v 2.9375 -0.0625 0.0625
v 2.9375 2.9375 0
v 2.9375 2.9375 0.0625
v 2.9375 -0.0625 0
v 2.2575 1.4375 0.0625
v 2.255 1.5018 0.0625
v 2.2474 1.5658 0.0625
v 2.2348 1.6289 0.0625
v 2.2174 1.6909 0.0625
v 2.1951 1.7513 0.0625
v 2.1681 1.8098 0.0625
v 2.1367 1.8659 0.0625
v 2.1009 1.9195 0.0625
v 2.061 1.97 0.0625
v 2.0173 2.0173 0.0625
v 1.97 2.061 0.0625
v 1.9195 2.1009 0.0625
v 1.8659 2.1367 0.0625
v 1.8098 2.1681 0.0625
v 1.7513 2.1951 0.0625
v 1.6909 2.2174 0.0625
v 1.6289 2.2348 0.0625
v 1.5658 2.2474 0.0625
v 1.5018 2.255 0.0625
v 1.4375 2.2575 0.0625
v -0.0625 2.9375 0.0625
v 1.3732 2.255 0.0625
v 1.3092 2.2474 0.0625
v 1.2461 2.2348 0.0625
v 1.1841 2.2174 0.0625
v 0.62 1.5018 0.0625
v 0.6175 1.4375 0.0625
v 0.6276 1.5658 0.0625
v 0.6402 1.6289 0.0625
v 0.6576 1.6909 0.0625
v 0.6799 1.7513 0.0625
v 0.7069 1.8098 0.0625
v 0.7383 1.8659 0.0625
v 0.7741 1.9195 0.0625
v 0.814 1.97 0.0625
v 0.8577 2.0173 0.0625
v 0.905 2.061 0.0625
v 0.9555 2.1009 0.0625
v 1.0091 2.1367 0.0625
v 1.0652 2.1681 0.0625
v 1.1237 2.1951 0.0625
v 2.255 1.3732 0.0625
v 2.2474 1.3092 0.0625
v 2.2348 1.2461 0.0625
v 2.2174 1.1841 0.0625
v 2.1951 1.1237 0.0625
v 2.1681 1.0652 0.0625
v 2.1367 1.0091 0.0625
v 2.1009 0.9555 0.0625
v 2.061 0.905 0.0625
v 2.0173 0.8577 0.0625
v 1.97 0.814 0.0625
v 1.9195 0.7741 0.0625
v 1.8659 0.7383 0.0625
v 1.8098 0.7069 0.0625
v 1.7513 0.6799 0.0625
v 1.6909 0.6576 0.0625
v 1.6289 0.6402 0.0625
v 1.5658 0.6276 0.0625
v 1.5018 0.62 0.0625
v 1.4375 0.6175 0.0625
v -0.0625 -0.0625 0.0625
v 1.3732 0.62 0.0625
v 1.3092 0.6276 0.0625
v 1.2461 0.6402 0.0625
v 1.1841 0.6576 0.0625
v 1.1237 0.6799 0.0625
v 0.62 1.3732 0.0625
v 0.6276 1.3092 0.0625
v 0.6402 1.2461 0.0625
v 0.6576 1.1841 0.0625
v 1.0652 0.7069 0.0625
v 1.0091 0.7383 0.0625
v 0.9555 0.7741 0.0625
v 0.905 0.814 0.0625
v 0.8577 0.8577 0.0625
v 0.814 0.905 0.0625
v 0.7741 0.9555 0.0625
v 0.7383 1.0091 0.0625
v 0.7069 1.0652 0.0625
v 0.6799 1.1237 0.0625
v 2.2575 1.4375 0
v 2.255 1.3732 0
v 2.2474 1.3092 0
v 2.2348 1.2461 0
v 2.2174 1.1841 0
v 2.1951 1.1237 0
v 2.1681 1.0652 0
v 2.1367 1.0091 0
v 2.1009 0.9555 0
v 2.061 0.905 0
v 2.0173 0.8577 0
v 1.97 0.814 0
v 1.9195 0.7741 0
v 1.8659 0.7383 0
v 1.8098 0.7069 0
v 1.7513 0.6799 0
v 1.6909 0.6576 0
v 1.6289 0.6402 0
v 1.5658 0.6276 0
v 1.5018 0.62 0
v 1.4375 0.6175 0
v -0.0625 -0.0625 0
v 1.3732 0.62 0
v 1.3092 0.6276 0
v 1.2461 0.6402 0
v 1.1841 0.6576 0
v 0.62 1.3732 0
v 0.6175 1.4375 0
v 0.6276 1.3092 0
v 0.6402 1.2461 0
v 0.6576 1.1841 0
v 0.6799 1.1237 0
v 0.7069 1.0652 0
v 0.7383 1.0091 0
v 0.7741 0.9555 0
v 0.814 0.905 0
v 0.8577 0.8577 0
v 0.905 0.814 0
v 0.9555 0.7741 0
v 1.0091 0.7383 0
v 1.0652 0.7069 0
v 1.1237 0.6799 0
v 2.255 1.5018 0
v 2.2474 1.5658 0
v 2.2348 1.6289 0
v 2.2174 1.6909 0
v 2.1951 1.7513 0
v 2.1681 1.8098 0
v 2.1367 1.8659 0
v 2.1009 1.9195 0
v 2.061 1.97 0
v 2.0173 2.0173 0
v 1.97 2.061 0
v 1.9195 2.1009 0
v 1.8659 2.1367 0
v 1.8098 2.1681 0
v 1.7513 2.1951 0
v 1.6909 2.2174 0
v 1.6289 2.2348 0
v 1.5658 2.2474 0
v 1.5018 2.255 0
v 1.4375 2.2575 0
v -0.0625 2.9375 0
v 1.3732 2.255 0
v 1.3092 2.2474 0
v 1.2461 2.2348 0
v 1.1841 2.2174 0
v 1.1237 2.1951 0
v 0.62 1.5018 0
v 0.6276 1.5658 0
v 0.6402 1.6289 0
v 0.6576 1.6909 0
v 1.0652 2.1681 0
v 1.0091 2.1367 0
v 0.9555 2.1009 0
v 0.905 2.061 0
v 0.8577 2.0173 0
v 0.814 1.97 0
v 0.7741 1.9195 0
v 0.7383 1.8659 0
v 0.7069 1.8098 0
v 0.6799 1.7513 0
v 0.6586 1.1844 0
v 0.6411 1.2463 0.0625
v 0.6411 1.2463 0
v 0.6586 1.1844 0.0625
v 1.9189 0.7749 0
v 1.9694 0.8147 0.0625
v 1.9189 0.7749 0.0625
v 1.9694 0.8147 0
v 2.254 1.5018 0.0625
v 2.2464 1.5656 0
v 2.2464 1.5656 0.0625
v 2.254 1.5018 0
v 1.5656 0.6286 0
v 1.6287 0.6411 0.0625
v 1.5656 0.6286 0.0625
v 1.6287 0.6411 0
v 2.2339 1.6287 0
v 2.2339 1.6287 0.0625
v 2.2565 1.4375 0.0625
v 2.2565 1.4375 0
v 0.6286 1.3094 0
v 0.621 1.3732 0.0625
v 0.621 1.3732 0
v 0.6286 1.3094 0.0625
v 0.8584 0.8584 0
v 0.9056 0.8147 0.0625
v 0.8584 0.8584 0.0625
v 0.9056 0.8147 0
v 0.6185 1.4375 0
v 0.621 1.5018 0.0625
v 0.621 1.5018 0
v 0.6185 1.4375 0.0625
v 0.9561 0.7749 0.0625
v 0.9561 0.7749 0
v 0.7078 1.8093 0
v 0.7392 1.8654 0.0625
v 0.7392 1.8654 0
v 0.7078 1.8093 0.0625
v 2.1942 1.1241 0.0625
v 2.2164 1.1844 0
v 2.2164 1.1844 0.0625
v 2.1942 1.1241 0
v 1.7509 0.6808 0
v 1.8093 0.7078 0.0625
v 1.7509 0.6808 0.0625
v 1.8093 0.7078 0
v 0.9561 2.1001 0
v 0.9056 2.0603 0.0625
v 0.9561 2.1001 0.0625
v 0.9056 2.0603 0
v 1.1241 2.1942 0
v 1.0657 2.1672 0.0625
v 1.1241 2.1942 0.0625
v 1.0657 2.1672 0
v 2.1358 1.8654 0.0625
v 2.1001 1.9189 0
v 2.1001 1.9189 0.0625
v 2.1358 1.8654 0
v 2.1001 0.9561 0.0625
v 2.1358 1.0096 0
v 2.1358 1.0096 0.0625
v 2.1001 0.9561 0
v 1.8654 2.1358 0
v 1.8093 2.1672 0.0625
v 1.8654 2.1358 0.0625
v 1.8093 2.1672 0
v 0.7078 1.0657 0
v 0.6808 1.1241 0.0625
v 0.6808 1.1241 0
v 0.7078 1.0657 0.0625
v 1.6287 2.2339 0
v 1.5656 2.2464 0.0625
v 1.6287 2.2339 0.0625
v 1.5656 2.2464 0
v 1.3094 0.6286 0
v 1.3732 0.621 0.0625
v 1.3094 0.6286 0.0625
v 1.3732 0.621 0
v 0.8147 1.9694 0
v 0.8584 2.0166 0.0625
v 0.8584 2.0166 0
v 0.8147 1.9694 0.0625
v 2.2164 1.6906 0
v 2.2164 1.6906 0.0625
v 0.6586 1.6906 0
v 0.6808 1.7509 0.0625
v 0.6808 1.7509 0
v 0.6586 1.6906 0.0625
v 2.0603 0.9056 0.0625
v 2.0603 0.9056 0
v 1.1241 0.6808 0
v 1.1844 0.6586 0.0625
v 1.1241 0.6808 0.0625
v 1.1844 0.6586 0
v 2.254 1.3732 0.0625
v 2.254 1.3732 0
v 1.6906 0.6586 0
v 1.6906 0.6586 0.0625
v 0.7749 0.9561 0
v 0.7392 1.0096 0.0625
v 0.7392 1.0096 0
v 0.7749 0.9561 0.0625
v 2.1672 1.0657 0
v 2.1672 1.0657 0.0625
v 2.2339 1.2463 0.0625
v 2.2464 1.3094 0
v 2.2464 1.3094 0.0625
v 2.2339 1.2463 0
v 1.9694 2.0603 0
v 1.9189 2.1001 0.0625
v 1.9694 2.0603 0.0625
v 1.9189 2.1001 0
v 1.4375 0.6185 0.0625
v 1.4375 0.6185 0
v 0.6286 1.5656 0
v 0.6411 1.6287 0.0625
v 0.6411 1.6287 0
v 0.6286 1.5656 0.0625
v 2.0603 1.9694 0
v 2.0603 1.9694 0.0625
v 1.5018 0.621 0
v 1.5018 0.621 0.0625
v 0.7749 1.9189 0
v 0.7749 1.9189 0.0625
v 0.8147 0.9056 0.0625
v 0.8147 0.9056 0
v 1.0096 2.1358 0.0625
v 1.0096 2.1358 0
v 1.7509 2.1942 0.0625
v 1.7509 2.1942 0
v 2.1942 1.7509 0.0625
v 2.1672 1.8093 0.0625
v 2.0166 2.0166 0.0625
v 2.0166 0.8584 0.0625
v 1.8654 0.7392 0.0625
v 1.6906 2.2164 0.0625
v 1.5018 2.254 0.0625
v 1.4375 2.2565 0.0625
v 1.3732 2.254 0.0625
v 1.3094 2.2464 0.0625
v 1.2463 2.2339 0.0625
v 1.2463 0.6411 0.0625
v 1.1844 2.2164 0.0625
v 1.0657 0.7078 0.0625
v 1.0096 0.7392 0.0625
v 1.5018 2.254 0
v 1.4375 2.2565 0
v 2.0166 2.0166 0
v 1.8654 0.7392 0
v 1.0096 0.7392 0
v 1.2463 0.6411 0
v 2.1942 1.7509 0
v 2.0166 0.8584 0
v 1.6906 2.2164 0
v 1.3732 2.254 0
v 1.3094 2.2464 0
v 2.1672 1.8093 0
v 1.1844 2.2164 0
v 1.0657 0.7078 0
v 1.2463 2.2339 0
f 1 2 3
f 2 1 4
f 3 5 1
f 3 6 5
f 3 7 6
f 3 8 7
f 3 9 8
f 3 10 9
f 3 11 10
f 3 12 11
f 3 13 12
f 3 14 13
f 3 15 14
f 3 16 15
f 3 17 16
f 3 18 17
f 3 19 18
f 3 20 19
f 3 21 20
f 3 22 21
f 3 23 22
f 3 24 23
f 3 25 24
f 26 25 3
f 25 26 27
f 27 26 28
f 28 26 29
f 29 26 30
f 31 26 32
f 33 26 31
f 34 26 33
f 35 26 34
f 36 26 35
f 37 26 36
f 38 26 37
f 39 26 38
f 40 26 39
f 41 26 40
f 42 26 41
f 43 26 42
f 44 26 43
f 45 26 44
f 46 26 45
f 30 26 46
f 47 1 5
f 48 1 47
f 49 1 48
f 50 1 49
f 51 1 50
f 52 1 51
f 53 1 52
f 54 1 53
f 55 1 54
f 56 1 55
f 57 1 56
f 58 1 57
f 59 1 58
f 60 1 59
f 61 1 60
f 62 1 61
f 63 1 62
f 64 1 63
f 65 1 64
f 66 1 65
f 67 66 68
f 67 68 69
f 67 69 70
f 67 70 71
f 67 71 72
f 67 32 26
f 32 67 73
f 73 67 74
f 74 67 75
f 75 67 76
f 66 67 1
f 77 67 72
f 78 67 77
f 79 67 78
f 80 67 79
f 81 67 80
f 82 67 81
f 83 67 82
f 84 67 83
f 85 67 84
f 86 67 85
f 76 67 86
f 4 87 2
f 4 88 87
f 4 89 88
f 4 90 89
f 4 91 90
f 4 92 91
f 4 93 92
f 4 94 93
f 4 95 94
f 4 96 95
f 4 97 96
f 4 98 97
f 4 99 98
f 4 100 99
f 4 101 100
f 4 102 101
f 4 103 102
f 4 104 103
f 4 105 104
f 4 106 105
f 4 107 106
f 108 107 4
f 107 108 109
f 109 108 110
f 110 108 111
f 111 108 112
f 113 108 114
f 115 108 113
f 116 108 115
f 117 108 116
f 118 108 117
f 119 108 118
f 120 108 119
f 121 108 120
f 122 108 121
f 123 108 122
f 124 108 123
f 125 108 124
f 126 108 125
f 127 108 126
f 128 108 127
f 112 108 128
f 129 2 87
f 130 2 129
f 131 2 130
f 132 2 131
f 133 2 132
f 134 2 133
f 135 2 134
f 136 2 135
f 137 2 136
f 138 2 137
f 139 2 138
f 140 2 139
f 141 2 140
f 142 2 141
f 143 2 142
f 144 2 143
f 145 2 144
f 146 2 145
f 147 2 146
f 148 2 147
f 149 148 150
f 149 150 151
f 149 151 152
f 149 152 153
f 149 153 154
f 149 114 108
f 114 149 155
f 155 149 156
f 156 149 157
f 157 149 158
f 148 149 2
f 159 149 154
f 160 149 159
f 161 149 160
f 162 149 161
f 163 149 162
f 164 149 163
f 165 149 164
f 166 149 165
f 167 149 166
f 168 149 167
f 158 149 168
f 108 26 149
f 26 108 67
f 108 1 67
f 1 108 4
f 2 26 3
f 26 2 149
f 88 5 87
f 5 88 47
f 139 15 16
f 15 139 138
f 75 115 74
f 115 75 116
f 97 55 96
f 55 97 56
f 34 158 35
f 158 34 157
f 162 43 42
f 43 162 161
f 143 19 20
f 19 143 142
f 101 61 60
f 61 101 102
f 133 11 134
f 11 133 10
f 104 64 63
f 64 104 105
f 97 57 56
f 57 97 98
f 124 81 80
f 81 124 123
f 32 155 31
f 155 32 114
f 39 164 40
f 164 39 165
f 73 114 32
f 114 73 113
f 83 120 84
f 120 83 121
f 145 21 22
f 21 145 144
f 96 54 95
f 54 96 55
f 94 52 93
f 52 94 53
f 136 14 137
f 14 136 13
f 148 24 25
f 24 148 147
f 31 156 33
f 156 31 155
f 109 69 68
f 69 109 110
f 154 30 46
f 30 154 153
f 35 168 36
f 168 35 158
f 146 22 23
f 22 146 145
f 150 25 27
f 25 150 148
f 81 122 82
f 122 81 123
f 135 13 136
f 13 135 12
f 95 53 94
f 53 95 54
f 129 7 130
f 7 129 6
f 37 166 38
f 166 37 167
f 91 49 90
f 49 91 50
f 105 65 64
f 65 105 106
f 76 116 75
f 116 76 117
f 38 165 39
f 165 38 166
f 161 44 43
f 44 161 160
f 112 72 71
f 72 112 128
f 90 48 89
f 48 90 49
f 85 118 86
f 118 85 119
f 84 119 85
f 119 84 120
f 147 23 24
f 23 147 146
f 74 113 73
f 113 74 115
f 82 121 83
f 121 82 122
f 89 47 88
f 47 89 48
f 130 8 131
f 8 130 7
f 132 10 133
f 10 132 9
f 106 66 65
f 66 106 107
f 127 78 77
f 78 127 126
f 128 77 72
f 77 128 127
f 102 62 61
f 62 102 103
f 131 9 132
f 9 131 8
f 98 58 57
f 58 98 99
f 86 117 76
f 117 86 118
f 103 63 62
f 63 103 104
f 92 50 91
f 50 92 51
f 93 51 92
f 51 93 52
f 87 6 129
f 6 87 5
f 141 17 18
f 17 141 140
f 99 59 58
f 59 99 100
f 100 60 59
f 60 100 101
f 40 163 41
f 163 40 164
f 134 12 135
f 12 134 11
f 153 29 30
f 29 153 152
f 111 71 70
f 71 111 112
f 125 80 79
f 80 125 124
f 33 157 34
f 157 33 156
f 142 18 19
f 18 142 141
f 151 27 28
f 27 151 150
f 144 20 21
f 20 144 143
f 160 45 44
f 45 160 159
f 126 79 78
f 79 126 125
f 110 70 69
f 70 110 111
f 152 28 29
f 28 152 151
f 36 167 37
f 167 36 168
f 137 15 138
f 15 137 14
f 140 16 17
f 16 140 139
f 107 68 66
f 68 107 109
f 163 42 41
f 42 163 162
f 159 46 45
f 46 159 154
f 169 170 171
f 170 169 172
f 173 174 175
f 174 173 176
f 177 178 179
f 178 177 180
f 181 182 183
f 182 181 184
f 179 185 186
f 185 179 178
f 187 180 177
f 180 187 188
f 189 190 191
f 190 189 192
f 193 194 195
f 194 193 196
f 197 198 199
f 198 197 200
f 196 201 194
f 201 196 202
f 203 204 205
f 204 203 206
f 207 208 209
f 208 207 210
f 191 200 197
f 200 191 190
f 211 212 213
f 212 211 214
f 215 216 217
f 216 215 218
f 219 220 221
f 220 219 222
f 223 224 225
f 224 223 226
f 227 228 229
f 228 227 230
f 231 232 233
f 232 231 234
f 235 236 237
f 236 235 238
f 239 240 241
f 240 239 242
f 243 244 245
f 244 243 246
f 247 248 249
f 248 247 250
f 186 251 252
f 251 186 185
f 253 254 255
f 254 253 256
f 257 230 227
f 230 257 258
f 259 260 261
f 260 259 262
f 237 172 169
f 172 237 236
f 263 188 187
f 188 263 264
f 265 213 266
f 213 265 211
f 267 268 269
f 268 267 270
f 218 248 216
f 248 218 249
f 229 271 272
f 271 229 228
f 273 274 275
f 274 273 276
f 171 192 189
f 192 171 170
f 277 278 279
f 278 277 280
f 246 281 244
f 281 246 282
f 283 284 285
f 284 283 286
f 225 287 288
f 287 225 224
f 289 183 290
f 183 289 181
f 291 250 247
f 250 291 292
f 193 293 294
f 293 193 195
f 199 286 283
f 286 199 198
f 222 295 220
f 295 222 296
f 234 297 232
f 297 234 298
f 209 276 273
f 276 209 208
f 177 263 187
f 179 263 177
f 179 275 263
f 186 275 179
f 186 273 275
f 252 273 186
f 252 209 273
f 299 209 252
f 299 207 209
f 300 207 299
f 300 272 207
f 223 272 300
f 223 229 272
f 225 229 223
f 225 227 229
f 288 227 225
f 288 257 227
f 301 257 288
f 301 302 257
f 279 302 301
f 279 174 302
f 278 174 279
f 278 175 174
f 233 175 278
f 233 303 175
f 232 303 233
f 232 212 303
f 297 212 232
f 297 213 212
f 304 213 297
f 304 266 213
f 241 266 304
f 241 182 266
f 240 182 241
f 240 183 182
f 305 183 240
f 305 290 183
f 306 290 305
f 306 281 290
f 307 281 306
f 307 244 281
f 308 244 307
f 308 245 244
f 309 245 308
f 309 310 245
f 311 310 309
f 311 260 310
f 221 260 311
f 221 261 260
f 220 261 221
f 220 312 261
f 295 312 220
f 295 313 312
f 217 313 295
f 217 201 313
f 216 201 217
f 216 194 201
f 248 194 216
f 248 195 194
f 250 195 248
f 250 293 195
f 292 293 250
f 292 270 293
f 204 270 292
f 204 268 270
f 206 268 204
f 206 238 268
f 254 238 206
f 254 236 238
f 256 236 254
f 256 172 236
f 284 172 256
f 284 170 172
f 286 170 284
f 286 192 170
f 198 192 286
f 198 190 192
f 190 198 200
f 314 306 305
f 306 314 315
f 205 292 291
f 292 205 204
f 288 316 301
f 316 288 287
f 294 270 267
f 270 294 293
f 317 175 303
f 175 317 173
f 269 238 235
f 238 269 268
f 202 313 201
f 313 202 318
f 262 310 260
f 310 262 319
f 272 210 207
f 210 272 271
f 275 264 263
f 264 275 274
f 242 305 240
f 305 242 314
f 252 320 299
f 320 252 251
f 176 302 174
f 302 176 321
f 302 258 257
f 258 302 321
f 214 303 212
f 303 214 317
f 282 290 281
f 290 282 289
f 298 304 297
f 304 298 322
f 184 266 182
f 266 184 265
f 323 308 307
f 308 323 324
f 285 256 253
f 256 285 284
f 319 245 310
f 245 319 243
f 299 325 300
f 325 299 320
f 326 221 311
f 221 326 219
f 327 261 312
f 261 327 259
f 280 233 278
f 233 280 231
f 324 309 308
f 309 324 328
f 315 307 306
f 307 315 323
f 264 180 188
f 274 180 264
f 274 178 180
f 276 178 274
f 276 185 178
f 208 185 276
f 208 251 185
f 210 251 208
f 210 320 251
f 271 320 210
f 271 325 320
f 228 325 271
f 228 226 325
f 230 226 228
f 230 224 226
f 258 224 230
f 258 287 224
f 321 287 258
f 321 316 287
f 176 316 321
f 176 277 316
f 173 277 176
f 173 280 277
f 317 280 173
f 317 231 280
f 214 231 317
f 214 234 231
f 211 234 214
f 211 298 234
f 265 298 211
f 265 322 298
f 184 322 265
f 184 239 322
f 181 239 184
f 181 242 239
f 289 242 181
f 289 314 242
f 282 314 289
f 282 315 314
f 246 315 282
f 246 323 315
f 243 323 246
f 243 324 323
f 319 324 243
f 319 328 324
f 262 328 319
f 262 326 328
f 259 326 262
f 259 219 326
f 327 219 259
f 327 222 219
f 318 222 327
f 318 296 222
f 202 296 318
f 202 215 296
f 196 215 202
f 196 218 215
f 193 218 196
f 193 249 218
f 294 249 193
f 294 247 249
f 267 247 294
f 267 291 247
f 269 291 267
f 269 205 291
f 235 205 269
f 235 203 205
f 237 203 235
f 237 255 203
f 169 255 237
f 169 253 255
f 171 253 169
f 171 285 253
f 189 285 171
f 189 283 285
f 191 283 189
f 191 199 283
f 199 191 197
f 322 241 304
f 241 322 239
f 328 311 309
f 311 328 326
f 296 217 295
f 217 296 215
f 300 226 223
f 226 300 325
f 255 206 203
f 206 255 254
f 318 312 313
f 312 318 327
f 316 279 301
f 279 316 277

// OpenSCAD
// element110-5.scad
// Gear tile variant — number "5" in the bore.
// Units: inches

plate_w = 2 + 7/8;
plate_d = 2 + 7/8;
plate_h = 1/16;
frame_w = 1/16;

hole_d = 3/32;
hole_r = hole_d / 2;

// Gear geometry — centered on tile
gear_n      = 20;
gear_r_tip  = 1.18;
gear_r_root = 1.00;
gear_r_bore = 0.82;
tooth_hw    = 4.5;
tooth_tip_f = 0.80;

// ── Standard modules ─────────────────────────────────────────────────────────

module rivet_holes() {
    spacing_x = plate_w / 10;
    spacing_y = plate_d / 10;
    inset_x   = spacing_x / 2;
    inset_y   = spacing_y / 2;
    for (i = [0:9]) translate([inset_x + i * spacing_x, inset_y,           -1]) cylinder(h = plate_h + 2, r = hole_r, $fn = 20);
    for (i = [0:9]) translate([inset_x + i * spacing_x, plate_d - inset_y, -0.001]) cylinder(h = plate_h + 0.002, r = hole_r, $fn = 20);
    for (i = [0:9]) translate([inset_x,           inset_y + i * spacing_y, -0.001]) cylinder(h = plate_h + 0.002, r = hole_r, $fn = 20);
    for (i = [0:9]) translate([plate_w - inset_x, inset_y + i * spacing_y, -0.001]) cylinder(h = plate_h + 0.002, r = hole_r, $fn = 20);
}

module frame_with_id(colors = []) {
    id_cover = plate_h / 8;
    region_w = (plate_w + 2 * frame_w) / 6;
    mark_h   = plate_h - id_cover;

    color("black")
    difference() {
        translate([-frame_w, -frame_w, 0])
            cube([plate_w + 2 * frame_w, plate_d + 2 * frame_w, plate_h]);
        translate([0, 0, -0.001])
            cube([plate_w, plate_d, plate_h + 0.002]);
        translate([-frame_w, plate_d, -0.001])
            cube([plate_w + 2 * frame_w, frame_w + 0.002, plate_h + 0.002]);
    }

    for (i = [0:5]) {
        c = (colors[i] != undef) ? colors[i] : "black";
        color(c)
        translate([-frame_w + i * region_w, plate_d, 0])
            cube([region_w, frame_w, mark_h]);
        color("black")
        translate([-frame_w + i * region_w, plate_d, mark_h])
            cube([region_w, frame_w, id_cover]);
    }
}

module plate() {
    color("darkgray")
    cube([plate_w, plate_d, plate_h]);
}

rivet_h = plate_h;
module rivets() {
    spacing_x = plate_w / 10;
    spacing_y = plate_d / 10;
    inset_x   = spacing_x / 2;
    inset_y   = spacing_y / 2;
    color("lightgray") {
        for (i = [0:9]) translate([inset_x + i * spacing_x, inset_y,           0]) cylinder(h = rivet_h, r = hole_r, $fn = 20);
        for (i = [0:9]) translate([inset_x + i * spacing_x, plate_d - inset_y, 0]) cylinder(h = rivet_h, r = hole_r, $fn = 20);
        for (i = [0:9]) translate([inset_x,           inset_y + i * spacing_y, 0]) cylinder(h = rivet_h, r = hole_r, $fn = 20);
        for (i = [0:9]) translate([plate_w - inset_x, inset_y + i * spacing_y, 0]) cylinder(h = rivet_h, r = hole_r, $fn = 20);
    }
}

// ── Gear 2D helpers ───────────────────────────────────────────────────────────

module gear_tooth_2d() {
    polygon([
        [gear_r_root * cos(-tooth_hw),               gear_r_root * sin(-tooth_hw)],
        [gear_r_tip  * cos(-tooth_hw * tooth_tip_f),  gear_r_tip  * sin(-tooth_hw * tooth_tip_f)],
        [gear_r_tip  * cos( tooth_hw * tooth_tip_f),  gear_r_tip  * sin( tooth_hw * tooth_tip_f)],
        [gear_r_root * cos( tooth_hw),               gear_r_root * sin( tooth_hw)],
    ]);
}

module gear_2d() {
    pitch = 360 / gear_n;
    union() {
        circle(r = gear_r_root, $fn = gear_n * 8);
        for (i = [0:gear_n - 1]) rotate([0, 0, i * pitch]) gear_tooth_2d();
    }
}

// ── Gear holes & gear ────────────────────────────────────────────────────────

module gear_holes() {
    translate([plate_w / 2, plate_d / 2, -0.001])
    linear_extrude(plate_h + 0.002)
    difference() {
        gear_2d();
        circle(r = gear_r_bore, $fn = 80);
    }
}

module gear() {
    color("black")
    translate([plate_w / 2, plate_d / 2, 0])
    linear_extrude(plate_h)
    difference() { gear_2d(); circle(r = gear_r_bore, $fn = 80); }
}

// ── Gear bore hole & gear bore ────────────────────────────────────────────────

module gear_bore_holes() {
    translate([plate_w / 2, plate_d / 2, -0.001])
    linear_extrude(plate_h + 0.002)
    circle(r = gear_r_bore, $fn = 80);
}

module gear_bore() {
    color([0.80, 0.80, 0.80])
    translate([plate_w / 2, plate_d / 2, 0])
    linear_extrude(plate_h)
    circle(r = gear_r_bore - 0.001, $fn = 80);
}

// ── Label hole → label ────────────────────────────────────────────────────────

module label_holes() {
    translate([plate_w / 2, plate_d / 2, -0.001])
    linear_extrude(plate_h + 0.002)
    text("5", size = 1.1, halign = "center", valign = "center",
         font = "Liberation Sans:style=Bold");
}

module label() {
    color("green")
    translate([plate_w / 2, plate_d / 2, 0])
    linear_extrude(plate_h)
    text("5", size = 1.1, halign = "center", valign = "center",
         font = "Liberation Sans:style=Bold");
}

// ── Assembly ──────────────────────────────────────────────────────────────────
// Each level: difference() cuts the holes INTO the running assembly,
//             union() then adds the feature that fills those holes.
// Innermost = first step; outermost = last step.

frame_with_id(["green", "green", "green", "green", undef, "green"]);

union() {                                           // step 5: add label
    difference() {
        union() {                                   // step 4: add gear bore
            difference() {
                union() {                           // step 3: add gear
                    difference() {
                        union() {                   // step 2: add rivets
                            difference() {
                                plate();            // step 1: plate
                                rivet_holes();
                            }
                            rivets();
                        }
                        gear_holes();
                    }
                    gear();
                }
                gear_bore_holes();
            }
            gear_bore();
        }
        label_holes();
    }
    label();
}
